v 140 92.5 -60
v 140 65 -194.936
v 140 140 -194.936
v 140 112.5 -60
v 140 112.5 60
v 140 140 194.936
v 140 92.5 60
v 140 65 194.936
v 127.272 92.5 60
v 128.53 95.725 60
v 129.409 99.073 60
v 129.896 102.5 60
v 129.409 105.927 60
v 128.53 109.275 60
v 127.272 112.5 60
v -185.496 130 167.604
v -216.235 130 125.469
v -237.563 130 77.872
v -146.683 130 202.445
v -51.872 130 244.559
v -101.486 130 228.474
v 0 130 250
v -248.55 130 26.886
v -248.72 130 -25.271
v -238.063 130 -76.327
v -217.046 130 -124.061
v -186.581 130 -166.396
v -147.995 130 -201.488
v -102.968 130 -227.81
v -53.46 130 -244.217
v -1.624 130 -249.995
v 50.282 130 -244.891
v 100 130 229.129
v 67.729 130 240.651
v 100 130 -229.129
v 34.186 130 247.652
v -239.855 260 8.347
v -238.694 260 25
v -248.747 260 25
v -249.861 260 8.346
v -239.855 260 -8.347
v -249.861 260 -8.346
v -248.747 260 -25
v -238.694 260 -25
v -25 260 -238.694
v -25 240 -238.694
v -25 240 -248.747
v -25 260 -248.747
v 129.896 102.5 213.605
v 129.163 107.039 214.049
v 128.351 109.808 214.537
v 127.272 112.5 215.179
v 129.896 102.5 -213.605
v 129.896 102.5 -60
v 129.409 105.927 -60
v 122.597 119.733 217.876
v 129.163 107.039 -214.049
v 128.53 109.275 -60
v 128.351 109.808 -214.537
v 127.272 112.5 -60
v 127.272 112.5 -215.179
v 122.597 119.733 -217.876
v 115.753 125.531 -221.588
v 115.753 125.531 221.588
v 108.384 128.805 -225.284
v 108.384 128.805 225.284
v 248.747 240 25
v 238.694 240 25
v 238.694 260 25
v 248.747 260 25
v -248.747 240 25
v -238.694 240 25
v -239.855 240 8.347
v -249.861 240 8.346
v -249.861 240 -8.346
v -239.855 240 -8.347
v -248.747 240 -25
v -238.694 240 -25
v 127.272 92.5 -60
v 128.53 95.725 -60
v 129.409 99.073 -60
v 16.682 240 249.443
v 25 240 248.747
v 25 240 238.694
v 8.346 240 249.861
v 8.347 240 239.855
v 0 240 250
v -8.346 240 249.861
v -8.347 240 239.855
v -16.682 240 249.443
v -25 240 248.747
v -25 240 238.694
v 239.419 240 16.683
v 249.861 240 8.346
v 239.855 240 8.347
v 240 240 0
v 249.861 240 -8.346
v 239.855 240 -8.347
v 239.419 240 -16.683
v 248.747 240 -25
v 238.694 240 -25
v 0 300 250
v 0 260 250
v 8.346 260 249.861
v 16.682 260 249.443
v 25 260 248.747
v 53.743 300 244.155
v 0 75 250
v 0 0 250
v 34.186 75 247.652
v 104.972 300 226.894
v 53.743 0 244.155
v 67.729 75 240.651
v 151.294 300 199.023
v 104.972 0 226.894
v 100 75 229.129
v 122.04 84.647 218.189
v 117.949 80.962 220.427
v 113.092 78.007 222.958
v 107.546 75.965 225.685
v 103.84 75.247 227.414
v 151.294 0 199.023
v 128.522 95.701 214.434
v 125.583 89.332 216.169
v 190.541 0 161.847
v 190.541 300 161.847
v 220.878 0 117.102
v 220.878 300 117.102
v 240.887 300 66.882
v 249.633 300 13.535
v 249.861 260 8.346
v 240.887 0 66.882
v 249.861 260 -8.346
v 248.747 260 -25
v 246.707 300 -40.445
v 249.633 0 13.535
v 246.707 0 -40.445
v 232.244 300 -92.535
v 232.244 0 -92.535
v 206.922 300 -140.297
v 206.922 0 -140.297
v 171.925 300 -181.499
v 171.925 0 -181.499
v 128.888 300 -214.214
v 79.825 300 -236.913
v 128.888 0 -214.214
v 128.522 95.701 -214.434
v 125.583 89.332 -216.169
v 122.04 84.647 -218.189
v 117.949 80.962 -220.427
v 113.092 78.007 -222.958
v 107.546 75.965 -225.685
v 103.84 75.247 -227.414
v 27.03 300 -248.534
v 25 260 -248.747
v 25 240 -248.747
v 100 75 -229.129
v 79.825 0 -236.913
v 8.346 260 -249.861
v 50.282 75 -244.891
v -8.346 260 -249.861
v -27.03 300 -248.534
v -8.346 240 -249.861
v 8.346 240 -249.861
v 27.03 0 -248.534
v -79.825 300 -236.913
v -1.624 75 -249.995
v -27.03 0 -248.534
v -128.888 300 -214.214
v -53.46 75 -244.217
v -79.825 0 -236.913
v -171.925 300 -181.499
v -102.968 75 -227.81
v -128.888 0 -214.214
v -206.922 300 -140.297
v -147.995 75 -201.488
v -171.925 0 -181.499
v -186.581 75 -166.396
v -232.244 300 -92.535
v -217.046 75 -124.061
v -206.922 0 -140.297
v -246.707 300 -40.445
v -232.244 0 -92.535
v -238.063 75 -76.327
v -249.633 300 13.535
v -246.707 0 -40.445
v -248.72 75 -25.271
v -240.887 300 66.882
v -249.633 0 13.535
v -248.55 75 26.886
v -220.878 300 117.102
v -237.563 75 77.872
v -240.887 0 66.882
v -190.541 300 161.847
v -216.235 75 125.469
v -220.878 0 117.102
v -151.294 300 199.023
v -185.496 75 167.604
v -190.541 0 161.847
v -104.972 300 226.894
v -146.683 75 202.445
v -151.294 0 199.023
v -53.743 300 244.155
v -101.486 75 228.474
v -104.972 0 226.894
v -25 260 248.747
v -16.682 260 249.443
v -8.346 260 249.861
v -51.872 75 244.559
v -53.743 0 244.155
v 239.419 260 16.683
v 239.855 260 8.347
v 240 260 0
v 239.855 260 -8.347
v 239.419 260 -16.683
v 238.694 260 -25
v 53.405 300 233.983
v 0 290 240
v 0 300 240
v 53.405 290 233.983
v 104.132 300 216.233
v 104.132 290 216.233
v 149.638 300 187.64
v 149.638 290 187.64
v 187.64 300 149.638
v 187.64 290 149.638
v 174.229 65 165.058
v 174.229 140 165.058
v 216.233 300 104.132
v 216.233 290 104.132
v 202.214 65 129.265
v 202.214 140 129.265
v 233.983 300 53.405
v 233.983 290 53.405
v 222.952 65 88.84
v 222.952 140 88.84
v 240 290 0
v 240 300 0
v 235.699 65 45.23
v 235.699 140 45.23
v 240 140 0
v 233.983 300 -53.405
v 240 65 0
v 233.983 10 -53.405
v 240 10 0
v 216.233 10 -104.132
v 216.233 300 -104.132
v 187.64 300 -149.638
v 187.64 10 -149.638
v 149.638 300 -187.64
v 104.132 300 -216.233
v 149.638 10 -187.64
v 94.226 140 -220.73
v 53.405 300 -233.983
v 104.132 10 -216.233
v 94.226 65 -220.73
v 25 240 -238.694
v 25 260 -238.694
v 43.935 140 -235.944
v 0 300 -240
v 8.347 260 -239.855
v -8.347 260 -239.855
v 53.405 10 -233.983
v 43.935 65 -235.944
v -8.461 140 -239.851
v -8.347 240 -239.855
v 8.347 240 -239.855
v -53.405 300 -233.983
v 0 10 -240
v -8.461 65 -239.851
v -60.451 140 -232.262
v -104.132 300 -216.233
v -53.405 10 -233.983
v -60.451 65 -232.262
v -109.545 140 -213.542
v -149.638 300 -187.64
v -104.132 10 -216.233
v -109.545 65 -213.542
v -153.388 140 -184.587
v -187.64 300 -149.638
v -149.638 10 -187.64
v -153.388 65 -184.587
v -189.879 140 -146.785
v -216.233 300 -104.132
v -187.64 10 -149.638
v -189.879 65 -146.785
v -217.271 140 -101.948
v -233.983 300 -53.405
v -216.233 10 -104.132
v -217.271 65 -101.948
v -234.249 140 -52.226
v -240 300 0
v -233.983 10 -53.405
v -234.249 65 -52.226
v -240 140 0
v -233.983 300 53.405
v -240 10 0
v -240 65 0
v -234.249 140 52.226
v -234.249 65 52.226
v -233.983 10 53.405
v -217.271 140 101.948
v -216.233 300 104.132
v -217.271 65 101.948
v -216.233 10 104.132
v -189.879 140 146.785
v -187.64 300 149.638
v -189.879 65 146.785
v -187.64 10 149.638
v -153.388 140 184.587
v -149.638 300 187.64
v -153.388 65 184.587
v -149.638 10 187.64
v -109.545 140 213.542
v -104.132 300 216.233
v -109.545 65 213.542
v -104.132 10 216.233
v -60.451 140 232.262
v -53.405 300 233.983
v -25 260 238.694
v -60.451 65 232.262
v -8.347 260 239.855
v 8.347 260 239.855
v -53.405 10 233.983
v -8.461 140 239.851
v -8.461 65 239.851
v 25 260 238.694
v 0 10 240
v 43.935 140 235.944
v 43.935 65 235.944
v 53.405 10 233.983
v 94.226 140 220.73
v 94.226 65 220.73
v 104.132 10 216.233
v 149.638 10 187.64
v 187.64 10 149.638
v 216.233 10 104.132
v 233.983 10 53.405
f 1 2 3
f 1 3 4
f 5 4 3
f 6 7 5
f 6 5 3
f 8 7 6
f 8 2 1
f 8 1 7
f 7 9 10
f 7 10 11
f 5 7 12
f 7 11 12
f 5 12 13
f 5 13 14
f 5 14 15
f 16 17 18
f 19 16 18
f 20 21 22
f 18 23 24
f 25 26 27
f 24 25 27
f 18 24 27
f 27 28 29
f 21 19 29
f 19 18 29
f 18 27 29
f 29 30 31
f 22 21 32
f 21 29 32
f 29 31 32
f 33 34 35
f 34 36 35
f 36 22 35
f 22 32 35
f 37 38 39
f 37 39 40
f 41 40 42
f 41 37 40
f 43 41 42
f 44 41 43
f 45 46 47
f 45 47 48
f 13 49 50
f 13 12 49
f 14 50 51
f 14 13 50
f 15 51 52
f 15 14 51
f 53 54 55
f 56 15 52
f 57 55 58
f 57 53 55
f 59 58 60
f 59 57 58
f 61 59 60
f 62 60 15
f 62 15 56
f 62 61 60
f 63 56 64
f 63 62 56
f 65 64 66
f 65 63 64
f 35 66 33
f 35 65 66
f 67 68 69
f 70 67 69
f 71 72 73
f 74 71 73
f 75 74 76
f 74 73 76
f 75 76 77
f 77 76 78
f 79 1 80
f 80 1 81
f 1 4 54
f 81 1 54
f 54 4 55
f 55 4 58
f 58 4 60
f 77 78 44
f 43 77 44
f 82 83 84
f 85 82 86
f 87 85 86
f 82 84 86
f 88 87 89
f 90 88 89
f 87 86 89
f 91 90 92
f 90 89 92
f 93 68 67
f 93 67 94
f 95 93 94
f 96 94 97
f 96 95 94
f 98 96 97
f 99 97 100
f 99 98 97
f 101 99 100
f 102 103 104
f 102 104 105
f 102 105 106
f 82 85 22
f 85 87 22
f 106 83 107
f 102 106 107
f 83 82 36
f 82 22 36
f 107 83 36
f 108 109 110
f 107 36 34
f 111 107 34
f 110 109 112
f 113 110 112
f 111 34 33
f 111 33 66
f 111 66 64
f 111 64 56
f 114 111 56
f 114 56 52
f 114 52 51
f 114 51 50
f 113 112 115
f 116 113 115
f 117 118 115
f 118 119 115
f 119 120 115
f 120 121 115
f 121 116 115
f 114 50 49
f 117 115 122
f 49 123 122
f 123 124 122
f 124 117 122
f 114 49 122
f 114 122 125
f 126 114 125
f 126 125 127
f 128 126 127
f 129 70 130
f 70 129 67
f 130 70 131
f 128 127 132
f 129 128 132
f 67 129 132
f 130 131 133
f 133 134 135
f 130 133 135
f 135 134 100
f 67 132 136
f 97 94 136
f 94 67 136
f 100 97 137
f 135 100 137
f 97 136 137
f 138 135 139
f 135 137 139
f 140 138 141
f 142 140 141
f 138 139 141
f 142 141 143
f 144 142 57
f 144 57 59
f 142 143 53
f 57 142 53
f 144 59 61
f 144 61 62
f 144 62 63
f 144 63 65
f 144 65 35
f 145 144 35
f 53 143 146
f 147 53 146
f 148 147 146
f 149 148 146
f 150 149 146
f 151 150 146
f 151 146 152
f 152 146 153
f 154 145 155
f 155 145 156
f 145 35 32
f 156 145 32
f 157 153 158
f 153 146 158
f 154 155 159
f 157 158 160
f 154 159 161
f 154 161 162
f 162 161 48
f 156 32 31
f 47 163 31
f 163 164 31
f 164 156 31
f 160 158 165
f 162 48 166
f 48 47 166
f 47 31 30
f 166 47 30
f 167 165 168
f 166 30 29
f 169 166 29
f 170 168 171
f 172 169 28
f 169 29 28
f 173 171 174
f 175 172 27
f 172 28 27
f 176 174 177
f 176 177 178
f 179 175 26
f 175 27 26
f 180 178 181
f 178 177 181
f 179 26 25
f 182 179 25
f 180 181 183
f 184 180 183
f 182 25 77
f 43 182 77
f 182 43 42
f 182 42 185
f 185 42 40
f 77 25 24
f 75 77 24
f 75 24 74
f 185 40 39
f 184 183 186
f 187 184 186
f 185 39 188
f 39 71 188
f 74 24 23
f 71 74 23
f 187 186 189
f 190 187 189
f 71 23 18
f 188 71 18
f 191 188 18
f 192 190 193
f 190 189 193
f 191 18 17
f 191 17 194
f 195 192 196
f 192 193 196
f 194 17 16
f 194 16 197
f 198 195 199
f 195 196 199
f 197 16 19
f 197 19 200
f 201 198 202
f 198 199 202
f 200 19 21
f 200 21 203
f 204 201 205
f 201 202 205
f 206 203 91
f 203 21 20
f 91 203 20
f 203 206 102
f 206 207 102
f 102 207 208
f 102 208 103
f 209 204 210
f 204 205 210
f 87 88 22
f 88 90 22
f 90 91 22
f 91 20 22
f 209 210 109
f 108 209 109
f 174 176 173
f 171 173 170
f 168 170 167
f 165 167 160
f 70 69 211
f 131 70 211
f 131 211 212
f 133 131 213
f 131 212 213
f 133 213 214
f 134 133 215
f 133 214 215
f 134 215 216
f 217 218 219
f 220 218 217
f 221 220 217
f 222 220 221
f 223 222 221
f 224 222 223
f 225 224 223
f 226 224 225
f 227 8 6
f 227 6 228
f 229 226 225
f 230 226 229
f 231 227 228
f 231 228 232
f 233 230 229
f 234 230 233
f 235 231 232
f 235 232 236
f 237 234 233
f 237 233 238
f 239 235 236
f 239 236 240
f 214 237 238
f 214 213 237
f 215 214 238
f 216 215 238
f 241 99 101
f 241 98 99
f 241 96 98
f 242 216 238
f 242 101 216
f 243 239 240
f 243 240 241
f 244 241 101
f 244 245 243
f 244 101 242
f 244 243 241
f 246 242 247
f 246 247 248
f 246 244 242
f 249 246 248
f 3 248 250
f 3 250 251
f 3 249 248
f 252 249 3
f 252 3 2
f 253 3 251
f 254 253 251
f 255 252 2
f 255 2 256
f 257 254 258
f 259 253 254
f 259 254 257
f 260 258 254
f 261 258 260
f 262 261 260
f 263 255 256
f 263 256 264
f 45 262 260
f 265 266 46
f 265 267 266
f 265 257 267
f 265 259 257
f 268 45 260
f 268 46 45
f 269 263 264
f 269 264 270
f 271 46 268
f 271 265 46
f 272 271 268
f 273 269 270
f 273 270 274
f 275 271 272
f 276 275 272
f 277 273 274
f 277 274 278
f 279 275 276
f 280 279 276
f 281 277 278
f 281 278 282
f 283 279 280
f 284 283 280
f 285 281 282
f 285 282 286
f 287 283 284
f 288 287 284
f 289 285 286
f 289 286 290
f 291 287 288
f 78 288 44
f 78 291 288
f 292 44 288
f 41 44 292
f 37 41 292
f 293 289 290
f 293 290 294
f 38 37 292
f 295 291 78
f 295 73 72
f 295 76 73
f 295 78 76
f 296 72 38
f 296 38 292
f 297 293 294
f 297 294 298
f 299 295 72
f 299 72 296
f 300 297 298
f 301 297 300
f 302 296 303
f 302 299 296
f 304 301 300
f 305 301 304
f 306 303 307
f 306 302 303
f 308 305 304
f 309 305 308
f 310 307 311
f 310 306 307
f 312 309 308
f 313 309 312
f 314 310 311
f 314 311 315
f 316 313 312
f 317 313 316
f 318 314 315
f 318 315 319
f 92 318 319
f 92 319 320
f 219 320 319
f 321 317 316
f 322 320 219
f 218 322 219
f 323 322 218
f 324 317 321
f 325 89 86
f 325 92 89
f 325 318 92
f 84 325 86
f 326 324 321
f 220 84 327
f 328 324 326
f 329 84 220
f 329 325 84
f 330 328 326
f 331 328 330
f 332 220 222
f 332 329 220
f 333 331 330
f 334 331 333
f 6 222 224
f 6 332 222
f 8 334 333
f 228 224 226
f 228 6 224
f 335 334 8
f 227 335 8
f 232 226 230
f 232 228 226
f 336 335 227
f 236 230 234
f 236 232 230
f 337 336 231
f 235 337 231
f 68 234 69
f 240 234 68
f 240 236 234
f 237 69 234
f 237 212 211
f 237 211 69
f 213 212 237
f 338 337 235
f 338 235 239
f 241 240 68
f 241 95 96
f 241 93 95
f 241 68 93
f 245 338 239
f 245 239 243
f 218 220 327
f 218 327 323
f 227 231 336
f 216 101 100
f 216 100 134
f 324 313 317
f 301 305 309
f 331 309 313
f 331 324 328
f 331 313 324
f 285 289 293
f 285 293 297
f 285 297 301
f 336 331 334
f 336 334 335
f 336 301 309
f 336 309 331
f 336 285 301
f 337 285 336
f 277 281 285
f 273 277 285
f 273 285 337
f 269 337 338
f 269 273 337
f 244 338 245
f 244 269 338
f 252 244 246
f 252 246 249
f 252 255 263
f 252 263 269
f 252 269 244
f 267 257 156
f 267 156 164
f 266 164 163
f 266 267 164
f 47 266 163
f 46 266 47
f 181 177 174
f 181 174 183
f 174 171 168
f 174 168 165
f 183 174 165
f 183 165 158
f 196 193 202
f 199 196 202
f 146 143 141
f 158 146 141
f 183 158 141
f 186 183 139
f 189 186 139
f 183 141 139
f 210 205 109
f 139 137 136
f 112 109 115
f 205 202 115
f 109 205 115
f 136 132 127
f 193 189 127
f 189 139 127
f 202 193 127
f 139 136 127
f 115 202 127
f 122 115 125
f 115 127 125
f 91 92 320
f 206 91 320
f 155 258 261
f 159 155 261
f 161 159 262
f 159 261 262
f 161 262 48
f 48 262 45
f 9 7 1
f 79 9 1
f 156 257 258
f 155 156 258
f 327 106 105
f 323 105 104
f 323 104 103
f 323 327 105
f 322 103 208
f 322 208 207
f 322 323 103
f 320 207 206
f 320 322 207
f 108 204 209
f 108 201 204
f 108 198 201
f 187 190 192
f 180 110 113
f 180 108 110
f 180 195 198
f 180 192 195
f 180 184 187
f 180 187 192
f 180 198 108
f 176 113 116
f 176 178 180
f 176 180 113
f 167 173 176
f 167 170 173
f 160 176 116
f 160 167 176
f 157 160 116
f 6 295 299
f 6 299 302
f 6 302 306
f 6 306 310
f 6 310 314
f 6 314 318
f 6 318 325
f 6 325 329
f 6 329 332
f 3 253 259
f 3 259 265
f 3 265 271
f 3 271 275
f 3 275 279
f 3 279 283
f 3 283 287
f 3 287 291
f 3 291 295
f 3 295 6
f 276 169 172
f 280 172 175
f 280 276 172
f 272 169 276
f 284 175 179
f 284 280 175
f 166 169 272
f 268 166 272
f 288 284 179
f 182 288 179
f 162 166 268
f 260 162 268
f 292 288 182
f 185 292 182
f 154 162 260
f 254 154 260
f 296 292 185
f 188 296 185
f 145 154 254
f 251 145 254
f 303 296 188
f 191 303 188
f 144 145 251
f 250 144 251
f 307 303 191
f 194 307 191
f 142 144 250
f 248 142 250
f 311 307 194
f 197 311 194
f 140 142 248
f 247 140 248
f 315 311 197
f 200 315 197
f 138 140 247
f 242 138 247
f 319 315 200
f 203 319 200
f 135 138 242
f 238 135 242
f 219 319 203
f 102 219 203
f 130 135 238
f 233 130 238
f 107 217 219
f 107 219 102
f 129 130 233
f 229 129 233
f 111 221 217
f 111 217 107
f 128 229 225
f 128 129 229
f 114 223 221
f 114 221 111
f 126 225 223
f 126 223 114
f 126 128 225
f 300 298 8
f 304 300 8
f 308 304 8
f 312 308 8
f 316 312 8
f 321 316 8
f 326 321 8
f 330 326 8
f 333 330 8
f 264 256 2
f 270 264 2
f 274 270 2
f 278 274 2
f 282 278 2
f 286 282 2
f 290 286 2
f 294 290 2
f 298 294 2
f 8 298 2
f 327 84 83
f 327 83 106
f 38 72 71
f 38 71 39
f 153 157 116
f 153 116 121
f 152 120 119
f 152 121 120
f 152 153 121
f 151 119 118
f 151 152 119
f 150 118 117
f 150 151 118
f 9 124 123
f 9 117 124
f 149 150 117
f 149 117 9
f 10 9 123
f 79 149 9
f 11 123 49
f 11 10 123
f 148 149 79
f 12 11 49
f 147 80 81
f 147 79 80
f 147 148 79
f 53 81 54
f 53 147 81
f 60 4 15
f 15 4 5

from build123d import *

# Parameters (mm, degrees)
SKETCH2_R                      = 250
BOSS_EXTRUDE1_DEPTH            = 300
CUT_EXTRUDE1_DEPTH             = 464.680924775
CUT_EXTRUDE1_DEPTH_BACK        = 464.680924775
SKETCH3_W                      = 380
SKETCH3_H                      = 55
SHELL1_START                   = 140
SHELL1_OUTLINE_R               = 240
SHELL1_DEPTH                   = 150
SHELL1_START_2                 = 10
SHELL1_2_OUTLINE_R             = 240
SHELL1_2_DEPTH                 = 55
SHELL1_START_3                 = 65
SHELL1_3_DEPTH                 = 75
CUT_EXTRUDE2_REACH             = 546.885
SKETCH4_W                      = 120
SKETCH4_H                      = 20
CUT_EXTRUDE5_START             = -20
SKETCH6_R                      = 240
CUT_EXTRUDE5_DEPTH             = 20
CUT_EXTRUDE6_REACH             = 465.681
SKETCH8_3_W                    = 50
SKETCH8_3_H                    = 20
CUT_EXTRUDE6_DIRECTION_2_DEPTH = 464.680924775
CIRPATTERN1_COUNT              = 2
CIRPATTERN1_ANGLE              = 90
FILLET2_R                      = 30


# Read off the part's stored shape, not the designer's step: Shell1
with BuildPart() as part:
    # Sketch2 → Boss-Extrude1 (new body)
    with BuildSketch(Plane(origin=(0, 0, 0), x_dir=(1, 0, 0), z_dir=(0, 1, 0))):
        with Locations(Location((0, 0, 0), (0, 0, 270))):
            Circle(SKETCH2_R)
    extrude(amount=BOSS_EXTRUDE1_DEPTH)

    # Sketch3 → Cut-Extrude1 (cut, two sides: drawn at the far end of the back side and taken through both)
    with BuildSketch(Plane.XY.offset(-CUT_EXTRUDE1_DEPTH_BACK)):
        with Locations((-60, 102.5)):
            Rectangle(SKETCH3_W, SKETCH3_H)
    extrude(amount=CUT_EXTRUDE1_DEPTH + CUT_EXTRUDE1_DEPTH_BACK, mode=Mode.SUBTRACT)

    # Shell1 outline → Shell1 (cut)
    with BuildSketch(Plane(origin=(0, 0, 0), x_dir=(1, 0, 0), z_dir=(0, 1, 0)).offset(SHELL1_START)):
        Circle(SHELL1_OUTLINE_R)
    extrude(amount=SHELL1_DEPTH, mode=Mode.SUBTRACT)

    # Shell1 2 outline → Shell1 2 (cut)
    with BuildSketch(Plane(origin=(0, 0, 0), x_dir=(1, 0, 0), z_dir=(0, 1, 0)).offset(SHELL1_START_2)):
        Circle(SHELL1_2_OUTLINE_R)
    extrude(amount=SHELL1_2_DEPTH, mode=Mode.SUBTRACT)

    # Shell1 3 outline → Shell1 3 (cut)
    with BuildSketch(Plane(origin=(0, 0, 0), x_dir=(1, 0, 0), z_dir=(0, 1, 0)).offset(SHELL1_START_3)):
        with BuildLine():
            ThreePointArc((140, -194.935886896), (240, 0), (140, 194.935886896))
            Line((140, 194.935886896), (140, -194.935886896))
        make_face()
    extrude(amount=SHELL1_3_DEPTH, mode=Mode.SUBTRACT)

    # Sketch4 → Cut-Extrude2 (cut, up to next)
    with BuildSketch(Plane.ZY.offset(-130), mode=Mode.PRIVATE) as cut_extrude2_sk1:
        with Locations((0, 102.5)):
            Rectangle(SKETCH4_W, SKETCH4_H)
    cut_extrude2_tool1 = extrude(cut_extrude2_sk1.sketch, amount=-CUT_EXTRUDE2_REACH, mode=Mode.PRIVATE) & part.part
    add(cut_extrude2_tool1.solids().sort_by_distance((130, 102.5, 0))[0], mode=Mode.SUBTRACT)

    # Sketch6 → Cut-Extrude5 (cut)
    with BuildSketch(Plane(origin=(0, 300, 0), x_dir=(1, 0, 0), z_dir=(0, 1, 0)).offset(CUT_EXTRUDE5_START)):
        with Locations(Location((0, 0, 0), (0, 0, 270))):
            Circle(SKETCH6_R)
    extrude(amount=CUT_EXTRUDE5_DEPTH, mode=Mode.SUBTRACT)

    # Sketch8<3> → Cut-Extrude6 (cut, up to next)
    with BuildSketch(Plane(origin=(0, 0, 0), x_dir=(0, 0, -1), z_dir=(1, 0, 0)), mode=Mode.PRIVATE) as cut_extrude6_sk1:
        with Locations((0, 250)):
            Rectangle(SKETCH8_3_W, SKETCH8_3_H)
    cut_extrude6_tool1 = extrude(cut_extrude6_sk1.sketch, amount=-CUT_EXTRUDE6_REACH, mode=Mode.PRIVATE) & part.part
    cut_extrude6 = cut_extrude6_tool1.solids().sort_by_distance((0, 250, 0))[0]
    add(cut_extrude6, mode=Mode.SUBTRACT)

    # Sketch8<3> → Cut-Extrude6 direction 2 (cut)
    with BuildSketch(Plane(origin=(0, 0, 0), x_dir=(0, 0, -1), z_dir=(1, 0, 0))):
        with Locations((0, 250)):
            Rectangle(SKETCH8_3_W, SKETCH8_3_H)
    cut_extrude6_direction_2 = extrude(amount=CUT_EXTRUDE6_DIRECTION_2_DEPTH, mode=Mode.SUBTRACT)

    # CirPattern1: Cut-Extrude6, Cut-Extrude6 direction 2 ×2 about axis
    cirpattern1_axis = Axis((0, 300, 0), (0, 1, 0))
    add([cut_extrude6.rotate(cirpattern1_axis, i * CIRPATTERN1_ANGLE / (CIRPATTERN1_COUNT - 1)) for i in range(1, CIRPATTERN1_COUNT)], mode=Mode.SUBTRACT)
    add([cut_extrude6_direction_2.rotate(cirpattern1_axis, i * CIRPATTERN1_ANGLE / (CIRPATTERN1_COUNT - 1)) for i in range(1, CIRPATTERN1_COUNT)], mode=Mode.SUBTRACT)

    # Fillet2
    # the kernel refuses this fillet: 30 mm, written as the material it adds along each edge
    with BuildSketch(Plane(origin=(130, 130, -288.541565041), x_dir=(0, -1, 0), z_dir=(0, 0, 1))) as fillet2_piece_1_section:
        with BuildLine():
            CenterArc((FILLET2_R, -FILLET2_R), FILLET2_R, 90, 90)
            Line((0, -FILLET2_R), (0, 0))
            Line((0, 0), (FILLET2_R, 0))
        make_face()
    fillet2_piece_1 = extrude(amount=577.083130081, mode=Mode.PRIVATE)
    fillet2_piece_1 = fillet2_piece_1 & Plane(origin=(0, 108.141191738, 0), x_dir=(0, 0, 1), z_dir=(0, -1, 0)) * Cylinder(250, 1275, mode=Mode.PRIVATE)
    fillet2_piece_1 = split(fillet2_piece_1, bisect_by=Plane(origin=(129.633192853, 108.141191738, -60), z_dir=(0, 0, -1)), keep=Keep.TOP, mode=Mode.PRIVATE)
    fillet2_piece_1 = split(fillet2_piece_1, bisect_by=Plane(origin=(129.633192853, 112.5, -136.881350588), z_dir=(0, -1, 0)), keep=Keep.TOP, mode=Mode.PRIVATE)
    add(fillet2_piece_1)
    with BuildSketch(Plane(origin=(130, 130, -288.541565041), x_dir=(0, -1, 0), z_dir=(0, 0, 1))) as fillet2_piece_2_section:
        with BuildLine():
            CenterArc((FILLET2_R, -FILLET2_R), FILLET2_R, 90, 90)
            Line((0, -FILLET2_R), (0, 0))
            Line((0, 0), (FILLET2_R, 0))
        make_face()
    fillet2_piece_2 = extrude(amount=577.083130081, mode=Mode.PRIVATE)
    fillet2_piece_2 = fillet2_piece_2 & Plane(origin=(0, 124.602125162, 0), x_dir=(0, 0, 1), z_dir=(0, -1, 0)) * Cylinder(250, 1275, mode=Mode.PRIVATE)
    fillet2_piece_2 = split(fillet2_piece_2, bisect_by=Plane(origin=(122.496617269, 124.602125162, -60), z_dir=(0, 0, -1)), keep=Keep.TOP, mode=Mode.PRIVATE)
    fillet2_piece_2 = split(fillet2_piece_2, bisect_by=Plane(origin=(122.496617269, 112.5, -138.903095836), z_dir=(0, 1, 0)), keep=Keep.TOP, mode=Mode.PRIVATE)
    add(fillet2_piece_2)
    with BuildSketch(Plane(origin=(130, 130, -288.541565041), x_dir=(0, -1, 0), z_dir=(0, 0, 1))) as fillet2_piece_3_section:
        with BuildLine():
            CenterArc((FILLET2_R, -FILLET2_R), FILLET2_R, 90, 90)
            Line((0, -FILLET2_R), (0, 0))
            Line((0, 0), (FILLET2_R, 0))
        make_face()
    fillet2_piece_3 = extrude(amount=577.083130081, mode=Mode.PRIVATE)
    fillet2_piece_3 = split(fillet2_piece_3, bisect_by=Plane(origin=(122.639576661, 124.541490092, -60), z_dir=(0, 0, 1)), keep=Keep.TOP, mode=Mode.PRIVATE)
    fillet2_piece_3 = split(fillet2_piece_3, bisect_by=Plane(origin=(122.639576661, 124.541490092, 60), z_dir=(0, 0, -1)), keep=Keep.TOP, mode=Mode.PRIVATE)
    fillet2_piece_3 = split(fillet2_piece_3, bisect_by=Plane(origin=(122.639576661, 112.5, 0), z_dir=(0, 1, 0)), keep=Keep.TOP, mode=Mode.PRIVATE)
    add(fillet2_piece_3)
    with BuildSketch(Plane(origin=(130, 130, -288.541565041), x_dir=(0, -1, 0), z_dir=(0, 0, 1))) as fillet2_piece_4_section:
        with BuildLine():
            CenterArc((FILLET2_R, -FILLET2_R), FILLET2_R, 90, 90)
            Line((0, -FILLET2_R), (0, 0))
            Line((0, 0), (FILLET2_R, 0))
        make_face()
    fillet2_piece_4 = extrude(amount=577.083130081, mode=Mode.PRIVATE)
    fillet2_piece_4 = fillet2_piece_4 & Plane(origin=(0, 108.141191737, 0), x_dir=(0, 0, 1), z_dir=(0, -1, 0)) * Cylinder(250, 1275, mode=Mode.PRIVATE)
    fillet2_piece_4 = split(fillet2_piece_4, bisect_by=Plane(origin=(129.633192853, 108.141191737, 60), z_dir=(0, 0, 1)), keep=Keep.TOP, mode=Mode.PRIVATE)
    fillet2_piece_4 = split(fillet2_piece_4, bisect_by=Plane(origin=(129.633192853, 112.5, 136.881350585), z_dir=(0, -1, 0)), keep=Keep.TOP, mode=Mode.PRIVATE)
    add(fillet2_piece_4)
    with BuildSketch(Plane(origin=(130, 130, -288.541565041), x_dir=(0, -1, 0), z_dir=(0, 0, 1))) as fillet2_piece_5_section:
        with BuildLine():
            CenterArc((FILLET2_R, -FILLET2_R), FILLET2_R, 90, 90)
            Line((0, -FILLET2_R), (0, 0))
            Line((0, 0), (FILLET2_R, 0))
        make_face()
    fillet2_piece_5 = extrude(amount=577.083130081, mode=Mode.PRIVATE)
    fillet2_piece_5 = fillet2_piece_5 & Plane(origin=(0, 124.602106632, 0), x_dir=(0, 0, 1), z_dir=(0, -1, 0)) * Cylinder(250, 1275, mode=Mode.PRIVATE)
    fillet2_piece_5 = split(fillet2_piece_5, bisect_by=Plane(origin=(122.496572682, 124.602106632, 60), z_dir=(0, 0, 1)), keep=Keep.TOP, mode=Mode.PRIVATE)
    fillet2_piece_5 = split(fillet2_piece_5, bisect_by=Plane(origin=(122.496572682, 112.5, 138.903516263), z_dir=(0, 1, 0)), keep=Keep.TOP, mode=Mode.PRIVATE)
    add(fillet2_piece_5)
    with BuildSketch(Plane(origin=(130, 75, -288.541565041), x_dir=(-1, 0, 0), z_dir=(0, 0, 1))) as fillet2_piece_6_section:
        with BuildLine():
            CenterArc((FILLET2_R, -FILLET2_R), FILLET2_R, 90, 90)
            Line((0, -FILLET2_R), (0, 0))
            Line((0, 0), (FILLET2_R, 0))
        make_face()
    fillet2_piece_6 = extrude(amount=577.083130081, mode=Mode.PRIVATE)
    fillet2_piece_6 = fillet2_piece_6 & Plane(origin=(0, 80.397884307, 0), x_dir=(0, 0, 1), z_dir=(0, -1, 0)) * Cylinder(250, 1275, mode=Mode.PRIVATE)
    fillet2_piece_6 = split(fillet2_piece_6, bisect_by=Plane(origin=(122.496621968, 80.397884307, -60), z_dir=(0, 0, -1)), keep=Keep.TOP, mode=Mode.PRIVATE)
    fillet2_piece_6 = split(fillet2_piece_6, bisect_by=Plane(origin=(122.496621968, 92.5, -138.903256412), z_dir=(0, -1, 0)), keep=Keep.TOP, mode=Mode.PRIVATE)
    add(fillet2_piece_6)
    with BuildSketch(Plane(origin=(130, 75, -288.541565041), x_dir=(-1, 0, 0), z_dir=(0, 0, 1))) as fillet2_piece_7_section:
        with BuildLine():
            CenterArc((FILLET2_R, -FILLET2_R), FILLET2_R, 90, 90)
            Line((0, -FILLET2_R), (0, 0))
            Line((0, 0), (FILLET2_R, 0))
        make_face()
    fillet2_piece_7 = extrude(amount=577.083130081, mode=Mode.PRIVATE)
    fillet2_piece_7 = fillet2_piece_7 & Plane(origin=(0, 96.858808254, 0), x_dir=(0, 0, 1), z_dir=(0, -1, 0)) * Cylinder(250, 1275, mode=Mode.PRIVATE)
    fillet2_piece_7 = split(fillet2_piece_7, bisect_by=Plane(origin=(129.633192853, 96.858808254, -60), z_dir=(0, 0, -1)), keep=Keep.TOP, mode=Mode.PRIVATE)
    fillet2_piece_7 = split(fillet2_piece_7, bisect_by=Plane(origin=(129.633192853, 92.5, -136.881350463), z_dir=(0, 1, 0)), keep=Keep.TOP, mode=Mode.PRIVATE)
    add(fillet2_piece_7)
    with BuildSketch(Plane(origin=(130, 75, -288.541565041), x_dir=(-1, 0, 0), z_dir=(0, 0, 1))) as fillet2_piece_8_section:
        with BuildLine():
            CenterArc((FILLET2_R, -FILLET2_R), FILLET2_R, 90, 90)
            Line((0, -FILLET2_R), (0, 0))
            Line((0, 0), (FILLET2_R, 0))
        make_face()
    fillet2_piece_8 = extrude(amount=577.083130081, mode=Mode.PRIVATE)
    fillet2_piece_8 = split(fillet2_piece_8, bisect_by=Plane(origin=(122.639576661, 80.458509908, -60), z_dir=(0, 0, 1)), keep=Keep.TOP, mode=Mode.PRIVATE)
    fillet2_piece_8 = split(fillet2_piece_8, bisect_by=Plane(origin=(122.639576661, 92.5, 0), z_dir=(0, -1, 0)), keep=Keep.TOP, mode=Mode.PRIVATE)
    fillet2_piece_8 = split(fillet2_piece_8, bisect_by=Plane(origin=(122.639576661, 80.458509908, 60), z_dir=(0, 0, -1)), keep=Keep.TOP, mode=Mode.PRIVATE)
    add(fillet2_piece_8)
    with BuildSketch(Plane(origin=(130, 75, -288.541565041), x_dir=(-1, 0, 0), z_dir=(0, 0, 1))) as fillet2_piece_9_section:
        with BuildLine():
            CenterArc((FILLET2_R, -FILLET2_R), FILLET2_R, 90, 90)
            Line((0, -FILLET2_R), (0, 0))
            Line((0, 0), (FILLET2_R, 0))
        make_face()
    fillet2_piece_9 = extrude(amount=577.083130081, mode=Mode.PRIVATE)
    fillet2_piece_9 = fillet2_piece_9 & Plane(origin=(0, 80.397869734, 0), x_dir=(0, 0, 1), z_dir=(0, -1, 0)) * Cylinder(250, 1275, mode=Mode.PRIVATE)
    fillet2_piece_9 = split(fillet2_piece_9, bisect_by=Plane(origin=(122.496641232, 92.5, 138.903074765), z_dir=(0, -1, 0)), keep=Keep.TOP, mode=Mode.PRIVATE)
    fillet2_piece_9 = split(fillet2_piece_9, bisect_by=Plane(origin=(122.496641232, 80.397869734, 60), z_dir=(0, 0, 1)), keep=Keep.TOP, mode=Mode.PRIVATE)
    add(fillet2_piece_9)
    with BuildSketch(Plane(origin=(130, 75, -288.541565041), x_dir=(-1, 0, 0), z_dir=(0, 0, 1))) as fillet2_piece_10_section:
        with BuildLine():
            CenterArc((FILLET2_R, -FILLET2_R), FILLET2_R, 90, 90)
            Line((0, -FILLET2_R), (0, 0))
            Line((0, 0), (FILLET2_R, 0))
        make_face()
    fillet2_piece_10 = extrude(amount=577.083130081, mode=Mode.PRIVATE)
    fillet2_piece_10 = fillet2_piece_10 & Plane(origin=(0, 96.858808255, 0), x_dir=(0, 0, 1), z_dir=(0, -1, 0)) * Cylinder(250, 1275, mode=Mode.PRIVATE)
    fillet2_piece_10 = split(fillet2_piece_10, bisect_by=Plane(origin=(129.633192854, 92.5, 136.881350462), z_dir=(0, 1, 0)), keep=Keep.TOP, mode=Mode.PRIVATE)
    fillet2_piece_10 = split(fillet2_piece_10, bisect_by=Plane(origin=(129.633192854, 96.858808255, 60), z_dir=(0, 0, 1)), keep=Keep.TOP, mode=Mode.PRIVATE)
    add(fillet2_piece_10)


solid = part.part
